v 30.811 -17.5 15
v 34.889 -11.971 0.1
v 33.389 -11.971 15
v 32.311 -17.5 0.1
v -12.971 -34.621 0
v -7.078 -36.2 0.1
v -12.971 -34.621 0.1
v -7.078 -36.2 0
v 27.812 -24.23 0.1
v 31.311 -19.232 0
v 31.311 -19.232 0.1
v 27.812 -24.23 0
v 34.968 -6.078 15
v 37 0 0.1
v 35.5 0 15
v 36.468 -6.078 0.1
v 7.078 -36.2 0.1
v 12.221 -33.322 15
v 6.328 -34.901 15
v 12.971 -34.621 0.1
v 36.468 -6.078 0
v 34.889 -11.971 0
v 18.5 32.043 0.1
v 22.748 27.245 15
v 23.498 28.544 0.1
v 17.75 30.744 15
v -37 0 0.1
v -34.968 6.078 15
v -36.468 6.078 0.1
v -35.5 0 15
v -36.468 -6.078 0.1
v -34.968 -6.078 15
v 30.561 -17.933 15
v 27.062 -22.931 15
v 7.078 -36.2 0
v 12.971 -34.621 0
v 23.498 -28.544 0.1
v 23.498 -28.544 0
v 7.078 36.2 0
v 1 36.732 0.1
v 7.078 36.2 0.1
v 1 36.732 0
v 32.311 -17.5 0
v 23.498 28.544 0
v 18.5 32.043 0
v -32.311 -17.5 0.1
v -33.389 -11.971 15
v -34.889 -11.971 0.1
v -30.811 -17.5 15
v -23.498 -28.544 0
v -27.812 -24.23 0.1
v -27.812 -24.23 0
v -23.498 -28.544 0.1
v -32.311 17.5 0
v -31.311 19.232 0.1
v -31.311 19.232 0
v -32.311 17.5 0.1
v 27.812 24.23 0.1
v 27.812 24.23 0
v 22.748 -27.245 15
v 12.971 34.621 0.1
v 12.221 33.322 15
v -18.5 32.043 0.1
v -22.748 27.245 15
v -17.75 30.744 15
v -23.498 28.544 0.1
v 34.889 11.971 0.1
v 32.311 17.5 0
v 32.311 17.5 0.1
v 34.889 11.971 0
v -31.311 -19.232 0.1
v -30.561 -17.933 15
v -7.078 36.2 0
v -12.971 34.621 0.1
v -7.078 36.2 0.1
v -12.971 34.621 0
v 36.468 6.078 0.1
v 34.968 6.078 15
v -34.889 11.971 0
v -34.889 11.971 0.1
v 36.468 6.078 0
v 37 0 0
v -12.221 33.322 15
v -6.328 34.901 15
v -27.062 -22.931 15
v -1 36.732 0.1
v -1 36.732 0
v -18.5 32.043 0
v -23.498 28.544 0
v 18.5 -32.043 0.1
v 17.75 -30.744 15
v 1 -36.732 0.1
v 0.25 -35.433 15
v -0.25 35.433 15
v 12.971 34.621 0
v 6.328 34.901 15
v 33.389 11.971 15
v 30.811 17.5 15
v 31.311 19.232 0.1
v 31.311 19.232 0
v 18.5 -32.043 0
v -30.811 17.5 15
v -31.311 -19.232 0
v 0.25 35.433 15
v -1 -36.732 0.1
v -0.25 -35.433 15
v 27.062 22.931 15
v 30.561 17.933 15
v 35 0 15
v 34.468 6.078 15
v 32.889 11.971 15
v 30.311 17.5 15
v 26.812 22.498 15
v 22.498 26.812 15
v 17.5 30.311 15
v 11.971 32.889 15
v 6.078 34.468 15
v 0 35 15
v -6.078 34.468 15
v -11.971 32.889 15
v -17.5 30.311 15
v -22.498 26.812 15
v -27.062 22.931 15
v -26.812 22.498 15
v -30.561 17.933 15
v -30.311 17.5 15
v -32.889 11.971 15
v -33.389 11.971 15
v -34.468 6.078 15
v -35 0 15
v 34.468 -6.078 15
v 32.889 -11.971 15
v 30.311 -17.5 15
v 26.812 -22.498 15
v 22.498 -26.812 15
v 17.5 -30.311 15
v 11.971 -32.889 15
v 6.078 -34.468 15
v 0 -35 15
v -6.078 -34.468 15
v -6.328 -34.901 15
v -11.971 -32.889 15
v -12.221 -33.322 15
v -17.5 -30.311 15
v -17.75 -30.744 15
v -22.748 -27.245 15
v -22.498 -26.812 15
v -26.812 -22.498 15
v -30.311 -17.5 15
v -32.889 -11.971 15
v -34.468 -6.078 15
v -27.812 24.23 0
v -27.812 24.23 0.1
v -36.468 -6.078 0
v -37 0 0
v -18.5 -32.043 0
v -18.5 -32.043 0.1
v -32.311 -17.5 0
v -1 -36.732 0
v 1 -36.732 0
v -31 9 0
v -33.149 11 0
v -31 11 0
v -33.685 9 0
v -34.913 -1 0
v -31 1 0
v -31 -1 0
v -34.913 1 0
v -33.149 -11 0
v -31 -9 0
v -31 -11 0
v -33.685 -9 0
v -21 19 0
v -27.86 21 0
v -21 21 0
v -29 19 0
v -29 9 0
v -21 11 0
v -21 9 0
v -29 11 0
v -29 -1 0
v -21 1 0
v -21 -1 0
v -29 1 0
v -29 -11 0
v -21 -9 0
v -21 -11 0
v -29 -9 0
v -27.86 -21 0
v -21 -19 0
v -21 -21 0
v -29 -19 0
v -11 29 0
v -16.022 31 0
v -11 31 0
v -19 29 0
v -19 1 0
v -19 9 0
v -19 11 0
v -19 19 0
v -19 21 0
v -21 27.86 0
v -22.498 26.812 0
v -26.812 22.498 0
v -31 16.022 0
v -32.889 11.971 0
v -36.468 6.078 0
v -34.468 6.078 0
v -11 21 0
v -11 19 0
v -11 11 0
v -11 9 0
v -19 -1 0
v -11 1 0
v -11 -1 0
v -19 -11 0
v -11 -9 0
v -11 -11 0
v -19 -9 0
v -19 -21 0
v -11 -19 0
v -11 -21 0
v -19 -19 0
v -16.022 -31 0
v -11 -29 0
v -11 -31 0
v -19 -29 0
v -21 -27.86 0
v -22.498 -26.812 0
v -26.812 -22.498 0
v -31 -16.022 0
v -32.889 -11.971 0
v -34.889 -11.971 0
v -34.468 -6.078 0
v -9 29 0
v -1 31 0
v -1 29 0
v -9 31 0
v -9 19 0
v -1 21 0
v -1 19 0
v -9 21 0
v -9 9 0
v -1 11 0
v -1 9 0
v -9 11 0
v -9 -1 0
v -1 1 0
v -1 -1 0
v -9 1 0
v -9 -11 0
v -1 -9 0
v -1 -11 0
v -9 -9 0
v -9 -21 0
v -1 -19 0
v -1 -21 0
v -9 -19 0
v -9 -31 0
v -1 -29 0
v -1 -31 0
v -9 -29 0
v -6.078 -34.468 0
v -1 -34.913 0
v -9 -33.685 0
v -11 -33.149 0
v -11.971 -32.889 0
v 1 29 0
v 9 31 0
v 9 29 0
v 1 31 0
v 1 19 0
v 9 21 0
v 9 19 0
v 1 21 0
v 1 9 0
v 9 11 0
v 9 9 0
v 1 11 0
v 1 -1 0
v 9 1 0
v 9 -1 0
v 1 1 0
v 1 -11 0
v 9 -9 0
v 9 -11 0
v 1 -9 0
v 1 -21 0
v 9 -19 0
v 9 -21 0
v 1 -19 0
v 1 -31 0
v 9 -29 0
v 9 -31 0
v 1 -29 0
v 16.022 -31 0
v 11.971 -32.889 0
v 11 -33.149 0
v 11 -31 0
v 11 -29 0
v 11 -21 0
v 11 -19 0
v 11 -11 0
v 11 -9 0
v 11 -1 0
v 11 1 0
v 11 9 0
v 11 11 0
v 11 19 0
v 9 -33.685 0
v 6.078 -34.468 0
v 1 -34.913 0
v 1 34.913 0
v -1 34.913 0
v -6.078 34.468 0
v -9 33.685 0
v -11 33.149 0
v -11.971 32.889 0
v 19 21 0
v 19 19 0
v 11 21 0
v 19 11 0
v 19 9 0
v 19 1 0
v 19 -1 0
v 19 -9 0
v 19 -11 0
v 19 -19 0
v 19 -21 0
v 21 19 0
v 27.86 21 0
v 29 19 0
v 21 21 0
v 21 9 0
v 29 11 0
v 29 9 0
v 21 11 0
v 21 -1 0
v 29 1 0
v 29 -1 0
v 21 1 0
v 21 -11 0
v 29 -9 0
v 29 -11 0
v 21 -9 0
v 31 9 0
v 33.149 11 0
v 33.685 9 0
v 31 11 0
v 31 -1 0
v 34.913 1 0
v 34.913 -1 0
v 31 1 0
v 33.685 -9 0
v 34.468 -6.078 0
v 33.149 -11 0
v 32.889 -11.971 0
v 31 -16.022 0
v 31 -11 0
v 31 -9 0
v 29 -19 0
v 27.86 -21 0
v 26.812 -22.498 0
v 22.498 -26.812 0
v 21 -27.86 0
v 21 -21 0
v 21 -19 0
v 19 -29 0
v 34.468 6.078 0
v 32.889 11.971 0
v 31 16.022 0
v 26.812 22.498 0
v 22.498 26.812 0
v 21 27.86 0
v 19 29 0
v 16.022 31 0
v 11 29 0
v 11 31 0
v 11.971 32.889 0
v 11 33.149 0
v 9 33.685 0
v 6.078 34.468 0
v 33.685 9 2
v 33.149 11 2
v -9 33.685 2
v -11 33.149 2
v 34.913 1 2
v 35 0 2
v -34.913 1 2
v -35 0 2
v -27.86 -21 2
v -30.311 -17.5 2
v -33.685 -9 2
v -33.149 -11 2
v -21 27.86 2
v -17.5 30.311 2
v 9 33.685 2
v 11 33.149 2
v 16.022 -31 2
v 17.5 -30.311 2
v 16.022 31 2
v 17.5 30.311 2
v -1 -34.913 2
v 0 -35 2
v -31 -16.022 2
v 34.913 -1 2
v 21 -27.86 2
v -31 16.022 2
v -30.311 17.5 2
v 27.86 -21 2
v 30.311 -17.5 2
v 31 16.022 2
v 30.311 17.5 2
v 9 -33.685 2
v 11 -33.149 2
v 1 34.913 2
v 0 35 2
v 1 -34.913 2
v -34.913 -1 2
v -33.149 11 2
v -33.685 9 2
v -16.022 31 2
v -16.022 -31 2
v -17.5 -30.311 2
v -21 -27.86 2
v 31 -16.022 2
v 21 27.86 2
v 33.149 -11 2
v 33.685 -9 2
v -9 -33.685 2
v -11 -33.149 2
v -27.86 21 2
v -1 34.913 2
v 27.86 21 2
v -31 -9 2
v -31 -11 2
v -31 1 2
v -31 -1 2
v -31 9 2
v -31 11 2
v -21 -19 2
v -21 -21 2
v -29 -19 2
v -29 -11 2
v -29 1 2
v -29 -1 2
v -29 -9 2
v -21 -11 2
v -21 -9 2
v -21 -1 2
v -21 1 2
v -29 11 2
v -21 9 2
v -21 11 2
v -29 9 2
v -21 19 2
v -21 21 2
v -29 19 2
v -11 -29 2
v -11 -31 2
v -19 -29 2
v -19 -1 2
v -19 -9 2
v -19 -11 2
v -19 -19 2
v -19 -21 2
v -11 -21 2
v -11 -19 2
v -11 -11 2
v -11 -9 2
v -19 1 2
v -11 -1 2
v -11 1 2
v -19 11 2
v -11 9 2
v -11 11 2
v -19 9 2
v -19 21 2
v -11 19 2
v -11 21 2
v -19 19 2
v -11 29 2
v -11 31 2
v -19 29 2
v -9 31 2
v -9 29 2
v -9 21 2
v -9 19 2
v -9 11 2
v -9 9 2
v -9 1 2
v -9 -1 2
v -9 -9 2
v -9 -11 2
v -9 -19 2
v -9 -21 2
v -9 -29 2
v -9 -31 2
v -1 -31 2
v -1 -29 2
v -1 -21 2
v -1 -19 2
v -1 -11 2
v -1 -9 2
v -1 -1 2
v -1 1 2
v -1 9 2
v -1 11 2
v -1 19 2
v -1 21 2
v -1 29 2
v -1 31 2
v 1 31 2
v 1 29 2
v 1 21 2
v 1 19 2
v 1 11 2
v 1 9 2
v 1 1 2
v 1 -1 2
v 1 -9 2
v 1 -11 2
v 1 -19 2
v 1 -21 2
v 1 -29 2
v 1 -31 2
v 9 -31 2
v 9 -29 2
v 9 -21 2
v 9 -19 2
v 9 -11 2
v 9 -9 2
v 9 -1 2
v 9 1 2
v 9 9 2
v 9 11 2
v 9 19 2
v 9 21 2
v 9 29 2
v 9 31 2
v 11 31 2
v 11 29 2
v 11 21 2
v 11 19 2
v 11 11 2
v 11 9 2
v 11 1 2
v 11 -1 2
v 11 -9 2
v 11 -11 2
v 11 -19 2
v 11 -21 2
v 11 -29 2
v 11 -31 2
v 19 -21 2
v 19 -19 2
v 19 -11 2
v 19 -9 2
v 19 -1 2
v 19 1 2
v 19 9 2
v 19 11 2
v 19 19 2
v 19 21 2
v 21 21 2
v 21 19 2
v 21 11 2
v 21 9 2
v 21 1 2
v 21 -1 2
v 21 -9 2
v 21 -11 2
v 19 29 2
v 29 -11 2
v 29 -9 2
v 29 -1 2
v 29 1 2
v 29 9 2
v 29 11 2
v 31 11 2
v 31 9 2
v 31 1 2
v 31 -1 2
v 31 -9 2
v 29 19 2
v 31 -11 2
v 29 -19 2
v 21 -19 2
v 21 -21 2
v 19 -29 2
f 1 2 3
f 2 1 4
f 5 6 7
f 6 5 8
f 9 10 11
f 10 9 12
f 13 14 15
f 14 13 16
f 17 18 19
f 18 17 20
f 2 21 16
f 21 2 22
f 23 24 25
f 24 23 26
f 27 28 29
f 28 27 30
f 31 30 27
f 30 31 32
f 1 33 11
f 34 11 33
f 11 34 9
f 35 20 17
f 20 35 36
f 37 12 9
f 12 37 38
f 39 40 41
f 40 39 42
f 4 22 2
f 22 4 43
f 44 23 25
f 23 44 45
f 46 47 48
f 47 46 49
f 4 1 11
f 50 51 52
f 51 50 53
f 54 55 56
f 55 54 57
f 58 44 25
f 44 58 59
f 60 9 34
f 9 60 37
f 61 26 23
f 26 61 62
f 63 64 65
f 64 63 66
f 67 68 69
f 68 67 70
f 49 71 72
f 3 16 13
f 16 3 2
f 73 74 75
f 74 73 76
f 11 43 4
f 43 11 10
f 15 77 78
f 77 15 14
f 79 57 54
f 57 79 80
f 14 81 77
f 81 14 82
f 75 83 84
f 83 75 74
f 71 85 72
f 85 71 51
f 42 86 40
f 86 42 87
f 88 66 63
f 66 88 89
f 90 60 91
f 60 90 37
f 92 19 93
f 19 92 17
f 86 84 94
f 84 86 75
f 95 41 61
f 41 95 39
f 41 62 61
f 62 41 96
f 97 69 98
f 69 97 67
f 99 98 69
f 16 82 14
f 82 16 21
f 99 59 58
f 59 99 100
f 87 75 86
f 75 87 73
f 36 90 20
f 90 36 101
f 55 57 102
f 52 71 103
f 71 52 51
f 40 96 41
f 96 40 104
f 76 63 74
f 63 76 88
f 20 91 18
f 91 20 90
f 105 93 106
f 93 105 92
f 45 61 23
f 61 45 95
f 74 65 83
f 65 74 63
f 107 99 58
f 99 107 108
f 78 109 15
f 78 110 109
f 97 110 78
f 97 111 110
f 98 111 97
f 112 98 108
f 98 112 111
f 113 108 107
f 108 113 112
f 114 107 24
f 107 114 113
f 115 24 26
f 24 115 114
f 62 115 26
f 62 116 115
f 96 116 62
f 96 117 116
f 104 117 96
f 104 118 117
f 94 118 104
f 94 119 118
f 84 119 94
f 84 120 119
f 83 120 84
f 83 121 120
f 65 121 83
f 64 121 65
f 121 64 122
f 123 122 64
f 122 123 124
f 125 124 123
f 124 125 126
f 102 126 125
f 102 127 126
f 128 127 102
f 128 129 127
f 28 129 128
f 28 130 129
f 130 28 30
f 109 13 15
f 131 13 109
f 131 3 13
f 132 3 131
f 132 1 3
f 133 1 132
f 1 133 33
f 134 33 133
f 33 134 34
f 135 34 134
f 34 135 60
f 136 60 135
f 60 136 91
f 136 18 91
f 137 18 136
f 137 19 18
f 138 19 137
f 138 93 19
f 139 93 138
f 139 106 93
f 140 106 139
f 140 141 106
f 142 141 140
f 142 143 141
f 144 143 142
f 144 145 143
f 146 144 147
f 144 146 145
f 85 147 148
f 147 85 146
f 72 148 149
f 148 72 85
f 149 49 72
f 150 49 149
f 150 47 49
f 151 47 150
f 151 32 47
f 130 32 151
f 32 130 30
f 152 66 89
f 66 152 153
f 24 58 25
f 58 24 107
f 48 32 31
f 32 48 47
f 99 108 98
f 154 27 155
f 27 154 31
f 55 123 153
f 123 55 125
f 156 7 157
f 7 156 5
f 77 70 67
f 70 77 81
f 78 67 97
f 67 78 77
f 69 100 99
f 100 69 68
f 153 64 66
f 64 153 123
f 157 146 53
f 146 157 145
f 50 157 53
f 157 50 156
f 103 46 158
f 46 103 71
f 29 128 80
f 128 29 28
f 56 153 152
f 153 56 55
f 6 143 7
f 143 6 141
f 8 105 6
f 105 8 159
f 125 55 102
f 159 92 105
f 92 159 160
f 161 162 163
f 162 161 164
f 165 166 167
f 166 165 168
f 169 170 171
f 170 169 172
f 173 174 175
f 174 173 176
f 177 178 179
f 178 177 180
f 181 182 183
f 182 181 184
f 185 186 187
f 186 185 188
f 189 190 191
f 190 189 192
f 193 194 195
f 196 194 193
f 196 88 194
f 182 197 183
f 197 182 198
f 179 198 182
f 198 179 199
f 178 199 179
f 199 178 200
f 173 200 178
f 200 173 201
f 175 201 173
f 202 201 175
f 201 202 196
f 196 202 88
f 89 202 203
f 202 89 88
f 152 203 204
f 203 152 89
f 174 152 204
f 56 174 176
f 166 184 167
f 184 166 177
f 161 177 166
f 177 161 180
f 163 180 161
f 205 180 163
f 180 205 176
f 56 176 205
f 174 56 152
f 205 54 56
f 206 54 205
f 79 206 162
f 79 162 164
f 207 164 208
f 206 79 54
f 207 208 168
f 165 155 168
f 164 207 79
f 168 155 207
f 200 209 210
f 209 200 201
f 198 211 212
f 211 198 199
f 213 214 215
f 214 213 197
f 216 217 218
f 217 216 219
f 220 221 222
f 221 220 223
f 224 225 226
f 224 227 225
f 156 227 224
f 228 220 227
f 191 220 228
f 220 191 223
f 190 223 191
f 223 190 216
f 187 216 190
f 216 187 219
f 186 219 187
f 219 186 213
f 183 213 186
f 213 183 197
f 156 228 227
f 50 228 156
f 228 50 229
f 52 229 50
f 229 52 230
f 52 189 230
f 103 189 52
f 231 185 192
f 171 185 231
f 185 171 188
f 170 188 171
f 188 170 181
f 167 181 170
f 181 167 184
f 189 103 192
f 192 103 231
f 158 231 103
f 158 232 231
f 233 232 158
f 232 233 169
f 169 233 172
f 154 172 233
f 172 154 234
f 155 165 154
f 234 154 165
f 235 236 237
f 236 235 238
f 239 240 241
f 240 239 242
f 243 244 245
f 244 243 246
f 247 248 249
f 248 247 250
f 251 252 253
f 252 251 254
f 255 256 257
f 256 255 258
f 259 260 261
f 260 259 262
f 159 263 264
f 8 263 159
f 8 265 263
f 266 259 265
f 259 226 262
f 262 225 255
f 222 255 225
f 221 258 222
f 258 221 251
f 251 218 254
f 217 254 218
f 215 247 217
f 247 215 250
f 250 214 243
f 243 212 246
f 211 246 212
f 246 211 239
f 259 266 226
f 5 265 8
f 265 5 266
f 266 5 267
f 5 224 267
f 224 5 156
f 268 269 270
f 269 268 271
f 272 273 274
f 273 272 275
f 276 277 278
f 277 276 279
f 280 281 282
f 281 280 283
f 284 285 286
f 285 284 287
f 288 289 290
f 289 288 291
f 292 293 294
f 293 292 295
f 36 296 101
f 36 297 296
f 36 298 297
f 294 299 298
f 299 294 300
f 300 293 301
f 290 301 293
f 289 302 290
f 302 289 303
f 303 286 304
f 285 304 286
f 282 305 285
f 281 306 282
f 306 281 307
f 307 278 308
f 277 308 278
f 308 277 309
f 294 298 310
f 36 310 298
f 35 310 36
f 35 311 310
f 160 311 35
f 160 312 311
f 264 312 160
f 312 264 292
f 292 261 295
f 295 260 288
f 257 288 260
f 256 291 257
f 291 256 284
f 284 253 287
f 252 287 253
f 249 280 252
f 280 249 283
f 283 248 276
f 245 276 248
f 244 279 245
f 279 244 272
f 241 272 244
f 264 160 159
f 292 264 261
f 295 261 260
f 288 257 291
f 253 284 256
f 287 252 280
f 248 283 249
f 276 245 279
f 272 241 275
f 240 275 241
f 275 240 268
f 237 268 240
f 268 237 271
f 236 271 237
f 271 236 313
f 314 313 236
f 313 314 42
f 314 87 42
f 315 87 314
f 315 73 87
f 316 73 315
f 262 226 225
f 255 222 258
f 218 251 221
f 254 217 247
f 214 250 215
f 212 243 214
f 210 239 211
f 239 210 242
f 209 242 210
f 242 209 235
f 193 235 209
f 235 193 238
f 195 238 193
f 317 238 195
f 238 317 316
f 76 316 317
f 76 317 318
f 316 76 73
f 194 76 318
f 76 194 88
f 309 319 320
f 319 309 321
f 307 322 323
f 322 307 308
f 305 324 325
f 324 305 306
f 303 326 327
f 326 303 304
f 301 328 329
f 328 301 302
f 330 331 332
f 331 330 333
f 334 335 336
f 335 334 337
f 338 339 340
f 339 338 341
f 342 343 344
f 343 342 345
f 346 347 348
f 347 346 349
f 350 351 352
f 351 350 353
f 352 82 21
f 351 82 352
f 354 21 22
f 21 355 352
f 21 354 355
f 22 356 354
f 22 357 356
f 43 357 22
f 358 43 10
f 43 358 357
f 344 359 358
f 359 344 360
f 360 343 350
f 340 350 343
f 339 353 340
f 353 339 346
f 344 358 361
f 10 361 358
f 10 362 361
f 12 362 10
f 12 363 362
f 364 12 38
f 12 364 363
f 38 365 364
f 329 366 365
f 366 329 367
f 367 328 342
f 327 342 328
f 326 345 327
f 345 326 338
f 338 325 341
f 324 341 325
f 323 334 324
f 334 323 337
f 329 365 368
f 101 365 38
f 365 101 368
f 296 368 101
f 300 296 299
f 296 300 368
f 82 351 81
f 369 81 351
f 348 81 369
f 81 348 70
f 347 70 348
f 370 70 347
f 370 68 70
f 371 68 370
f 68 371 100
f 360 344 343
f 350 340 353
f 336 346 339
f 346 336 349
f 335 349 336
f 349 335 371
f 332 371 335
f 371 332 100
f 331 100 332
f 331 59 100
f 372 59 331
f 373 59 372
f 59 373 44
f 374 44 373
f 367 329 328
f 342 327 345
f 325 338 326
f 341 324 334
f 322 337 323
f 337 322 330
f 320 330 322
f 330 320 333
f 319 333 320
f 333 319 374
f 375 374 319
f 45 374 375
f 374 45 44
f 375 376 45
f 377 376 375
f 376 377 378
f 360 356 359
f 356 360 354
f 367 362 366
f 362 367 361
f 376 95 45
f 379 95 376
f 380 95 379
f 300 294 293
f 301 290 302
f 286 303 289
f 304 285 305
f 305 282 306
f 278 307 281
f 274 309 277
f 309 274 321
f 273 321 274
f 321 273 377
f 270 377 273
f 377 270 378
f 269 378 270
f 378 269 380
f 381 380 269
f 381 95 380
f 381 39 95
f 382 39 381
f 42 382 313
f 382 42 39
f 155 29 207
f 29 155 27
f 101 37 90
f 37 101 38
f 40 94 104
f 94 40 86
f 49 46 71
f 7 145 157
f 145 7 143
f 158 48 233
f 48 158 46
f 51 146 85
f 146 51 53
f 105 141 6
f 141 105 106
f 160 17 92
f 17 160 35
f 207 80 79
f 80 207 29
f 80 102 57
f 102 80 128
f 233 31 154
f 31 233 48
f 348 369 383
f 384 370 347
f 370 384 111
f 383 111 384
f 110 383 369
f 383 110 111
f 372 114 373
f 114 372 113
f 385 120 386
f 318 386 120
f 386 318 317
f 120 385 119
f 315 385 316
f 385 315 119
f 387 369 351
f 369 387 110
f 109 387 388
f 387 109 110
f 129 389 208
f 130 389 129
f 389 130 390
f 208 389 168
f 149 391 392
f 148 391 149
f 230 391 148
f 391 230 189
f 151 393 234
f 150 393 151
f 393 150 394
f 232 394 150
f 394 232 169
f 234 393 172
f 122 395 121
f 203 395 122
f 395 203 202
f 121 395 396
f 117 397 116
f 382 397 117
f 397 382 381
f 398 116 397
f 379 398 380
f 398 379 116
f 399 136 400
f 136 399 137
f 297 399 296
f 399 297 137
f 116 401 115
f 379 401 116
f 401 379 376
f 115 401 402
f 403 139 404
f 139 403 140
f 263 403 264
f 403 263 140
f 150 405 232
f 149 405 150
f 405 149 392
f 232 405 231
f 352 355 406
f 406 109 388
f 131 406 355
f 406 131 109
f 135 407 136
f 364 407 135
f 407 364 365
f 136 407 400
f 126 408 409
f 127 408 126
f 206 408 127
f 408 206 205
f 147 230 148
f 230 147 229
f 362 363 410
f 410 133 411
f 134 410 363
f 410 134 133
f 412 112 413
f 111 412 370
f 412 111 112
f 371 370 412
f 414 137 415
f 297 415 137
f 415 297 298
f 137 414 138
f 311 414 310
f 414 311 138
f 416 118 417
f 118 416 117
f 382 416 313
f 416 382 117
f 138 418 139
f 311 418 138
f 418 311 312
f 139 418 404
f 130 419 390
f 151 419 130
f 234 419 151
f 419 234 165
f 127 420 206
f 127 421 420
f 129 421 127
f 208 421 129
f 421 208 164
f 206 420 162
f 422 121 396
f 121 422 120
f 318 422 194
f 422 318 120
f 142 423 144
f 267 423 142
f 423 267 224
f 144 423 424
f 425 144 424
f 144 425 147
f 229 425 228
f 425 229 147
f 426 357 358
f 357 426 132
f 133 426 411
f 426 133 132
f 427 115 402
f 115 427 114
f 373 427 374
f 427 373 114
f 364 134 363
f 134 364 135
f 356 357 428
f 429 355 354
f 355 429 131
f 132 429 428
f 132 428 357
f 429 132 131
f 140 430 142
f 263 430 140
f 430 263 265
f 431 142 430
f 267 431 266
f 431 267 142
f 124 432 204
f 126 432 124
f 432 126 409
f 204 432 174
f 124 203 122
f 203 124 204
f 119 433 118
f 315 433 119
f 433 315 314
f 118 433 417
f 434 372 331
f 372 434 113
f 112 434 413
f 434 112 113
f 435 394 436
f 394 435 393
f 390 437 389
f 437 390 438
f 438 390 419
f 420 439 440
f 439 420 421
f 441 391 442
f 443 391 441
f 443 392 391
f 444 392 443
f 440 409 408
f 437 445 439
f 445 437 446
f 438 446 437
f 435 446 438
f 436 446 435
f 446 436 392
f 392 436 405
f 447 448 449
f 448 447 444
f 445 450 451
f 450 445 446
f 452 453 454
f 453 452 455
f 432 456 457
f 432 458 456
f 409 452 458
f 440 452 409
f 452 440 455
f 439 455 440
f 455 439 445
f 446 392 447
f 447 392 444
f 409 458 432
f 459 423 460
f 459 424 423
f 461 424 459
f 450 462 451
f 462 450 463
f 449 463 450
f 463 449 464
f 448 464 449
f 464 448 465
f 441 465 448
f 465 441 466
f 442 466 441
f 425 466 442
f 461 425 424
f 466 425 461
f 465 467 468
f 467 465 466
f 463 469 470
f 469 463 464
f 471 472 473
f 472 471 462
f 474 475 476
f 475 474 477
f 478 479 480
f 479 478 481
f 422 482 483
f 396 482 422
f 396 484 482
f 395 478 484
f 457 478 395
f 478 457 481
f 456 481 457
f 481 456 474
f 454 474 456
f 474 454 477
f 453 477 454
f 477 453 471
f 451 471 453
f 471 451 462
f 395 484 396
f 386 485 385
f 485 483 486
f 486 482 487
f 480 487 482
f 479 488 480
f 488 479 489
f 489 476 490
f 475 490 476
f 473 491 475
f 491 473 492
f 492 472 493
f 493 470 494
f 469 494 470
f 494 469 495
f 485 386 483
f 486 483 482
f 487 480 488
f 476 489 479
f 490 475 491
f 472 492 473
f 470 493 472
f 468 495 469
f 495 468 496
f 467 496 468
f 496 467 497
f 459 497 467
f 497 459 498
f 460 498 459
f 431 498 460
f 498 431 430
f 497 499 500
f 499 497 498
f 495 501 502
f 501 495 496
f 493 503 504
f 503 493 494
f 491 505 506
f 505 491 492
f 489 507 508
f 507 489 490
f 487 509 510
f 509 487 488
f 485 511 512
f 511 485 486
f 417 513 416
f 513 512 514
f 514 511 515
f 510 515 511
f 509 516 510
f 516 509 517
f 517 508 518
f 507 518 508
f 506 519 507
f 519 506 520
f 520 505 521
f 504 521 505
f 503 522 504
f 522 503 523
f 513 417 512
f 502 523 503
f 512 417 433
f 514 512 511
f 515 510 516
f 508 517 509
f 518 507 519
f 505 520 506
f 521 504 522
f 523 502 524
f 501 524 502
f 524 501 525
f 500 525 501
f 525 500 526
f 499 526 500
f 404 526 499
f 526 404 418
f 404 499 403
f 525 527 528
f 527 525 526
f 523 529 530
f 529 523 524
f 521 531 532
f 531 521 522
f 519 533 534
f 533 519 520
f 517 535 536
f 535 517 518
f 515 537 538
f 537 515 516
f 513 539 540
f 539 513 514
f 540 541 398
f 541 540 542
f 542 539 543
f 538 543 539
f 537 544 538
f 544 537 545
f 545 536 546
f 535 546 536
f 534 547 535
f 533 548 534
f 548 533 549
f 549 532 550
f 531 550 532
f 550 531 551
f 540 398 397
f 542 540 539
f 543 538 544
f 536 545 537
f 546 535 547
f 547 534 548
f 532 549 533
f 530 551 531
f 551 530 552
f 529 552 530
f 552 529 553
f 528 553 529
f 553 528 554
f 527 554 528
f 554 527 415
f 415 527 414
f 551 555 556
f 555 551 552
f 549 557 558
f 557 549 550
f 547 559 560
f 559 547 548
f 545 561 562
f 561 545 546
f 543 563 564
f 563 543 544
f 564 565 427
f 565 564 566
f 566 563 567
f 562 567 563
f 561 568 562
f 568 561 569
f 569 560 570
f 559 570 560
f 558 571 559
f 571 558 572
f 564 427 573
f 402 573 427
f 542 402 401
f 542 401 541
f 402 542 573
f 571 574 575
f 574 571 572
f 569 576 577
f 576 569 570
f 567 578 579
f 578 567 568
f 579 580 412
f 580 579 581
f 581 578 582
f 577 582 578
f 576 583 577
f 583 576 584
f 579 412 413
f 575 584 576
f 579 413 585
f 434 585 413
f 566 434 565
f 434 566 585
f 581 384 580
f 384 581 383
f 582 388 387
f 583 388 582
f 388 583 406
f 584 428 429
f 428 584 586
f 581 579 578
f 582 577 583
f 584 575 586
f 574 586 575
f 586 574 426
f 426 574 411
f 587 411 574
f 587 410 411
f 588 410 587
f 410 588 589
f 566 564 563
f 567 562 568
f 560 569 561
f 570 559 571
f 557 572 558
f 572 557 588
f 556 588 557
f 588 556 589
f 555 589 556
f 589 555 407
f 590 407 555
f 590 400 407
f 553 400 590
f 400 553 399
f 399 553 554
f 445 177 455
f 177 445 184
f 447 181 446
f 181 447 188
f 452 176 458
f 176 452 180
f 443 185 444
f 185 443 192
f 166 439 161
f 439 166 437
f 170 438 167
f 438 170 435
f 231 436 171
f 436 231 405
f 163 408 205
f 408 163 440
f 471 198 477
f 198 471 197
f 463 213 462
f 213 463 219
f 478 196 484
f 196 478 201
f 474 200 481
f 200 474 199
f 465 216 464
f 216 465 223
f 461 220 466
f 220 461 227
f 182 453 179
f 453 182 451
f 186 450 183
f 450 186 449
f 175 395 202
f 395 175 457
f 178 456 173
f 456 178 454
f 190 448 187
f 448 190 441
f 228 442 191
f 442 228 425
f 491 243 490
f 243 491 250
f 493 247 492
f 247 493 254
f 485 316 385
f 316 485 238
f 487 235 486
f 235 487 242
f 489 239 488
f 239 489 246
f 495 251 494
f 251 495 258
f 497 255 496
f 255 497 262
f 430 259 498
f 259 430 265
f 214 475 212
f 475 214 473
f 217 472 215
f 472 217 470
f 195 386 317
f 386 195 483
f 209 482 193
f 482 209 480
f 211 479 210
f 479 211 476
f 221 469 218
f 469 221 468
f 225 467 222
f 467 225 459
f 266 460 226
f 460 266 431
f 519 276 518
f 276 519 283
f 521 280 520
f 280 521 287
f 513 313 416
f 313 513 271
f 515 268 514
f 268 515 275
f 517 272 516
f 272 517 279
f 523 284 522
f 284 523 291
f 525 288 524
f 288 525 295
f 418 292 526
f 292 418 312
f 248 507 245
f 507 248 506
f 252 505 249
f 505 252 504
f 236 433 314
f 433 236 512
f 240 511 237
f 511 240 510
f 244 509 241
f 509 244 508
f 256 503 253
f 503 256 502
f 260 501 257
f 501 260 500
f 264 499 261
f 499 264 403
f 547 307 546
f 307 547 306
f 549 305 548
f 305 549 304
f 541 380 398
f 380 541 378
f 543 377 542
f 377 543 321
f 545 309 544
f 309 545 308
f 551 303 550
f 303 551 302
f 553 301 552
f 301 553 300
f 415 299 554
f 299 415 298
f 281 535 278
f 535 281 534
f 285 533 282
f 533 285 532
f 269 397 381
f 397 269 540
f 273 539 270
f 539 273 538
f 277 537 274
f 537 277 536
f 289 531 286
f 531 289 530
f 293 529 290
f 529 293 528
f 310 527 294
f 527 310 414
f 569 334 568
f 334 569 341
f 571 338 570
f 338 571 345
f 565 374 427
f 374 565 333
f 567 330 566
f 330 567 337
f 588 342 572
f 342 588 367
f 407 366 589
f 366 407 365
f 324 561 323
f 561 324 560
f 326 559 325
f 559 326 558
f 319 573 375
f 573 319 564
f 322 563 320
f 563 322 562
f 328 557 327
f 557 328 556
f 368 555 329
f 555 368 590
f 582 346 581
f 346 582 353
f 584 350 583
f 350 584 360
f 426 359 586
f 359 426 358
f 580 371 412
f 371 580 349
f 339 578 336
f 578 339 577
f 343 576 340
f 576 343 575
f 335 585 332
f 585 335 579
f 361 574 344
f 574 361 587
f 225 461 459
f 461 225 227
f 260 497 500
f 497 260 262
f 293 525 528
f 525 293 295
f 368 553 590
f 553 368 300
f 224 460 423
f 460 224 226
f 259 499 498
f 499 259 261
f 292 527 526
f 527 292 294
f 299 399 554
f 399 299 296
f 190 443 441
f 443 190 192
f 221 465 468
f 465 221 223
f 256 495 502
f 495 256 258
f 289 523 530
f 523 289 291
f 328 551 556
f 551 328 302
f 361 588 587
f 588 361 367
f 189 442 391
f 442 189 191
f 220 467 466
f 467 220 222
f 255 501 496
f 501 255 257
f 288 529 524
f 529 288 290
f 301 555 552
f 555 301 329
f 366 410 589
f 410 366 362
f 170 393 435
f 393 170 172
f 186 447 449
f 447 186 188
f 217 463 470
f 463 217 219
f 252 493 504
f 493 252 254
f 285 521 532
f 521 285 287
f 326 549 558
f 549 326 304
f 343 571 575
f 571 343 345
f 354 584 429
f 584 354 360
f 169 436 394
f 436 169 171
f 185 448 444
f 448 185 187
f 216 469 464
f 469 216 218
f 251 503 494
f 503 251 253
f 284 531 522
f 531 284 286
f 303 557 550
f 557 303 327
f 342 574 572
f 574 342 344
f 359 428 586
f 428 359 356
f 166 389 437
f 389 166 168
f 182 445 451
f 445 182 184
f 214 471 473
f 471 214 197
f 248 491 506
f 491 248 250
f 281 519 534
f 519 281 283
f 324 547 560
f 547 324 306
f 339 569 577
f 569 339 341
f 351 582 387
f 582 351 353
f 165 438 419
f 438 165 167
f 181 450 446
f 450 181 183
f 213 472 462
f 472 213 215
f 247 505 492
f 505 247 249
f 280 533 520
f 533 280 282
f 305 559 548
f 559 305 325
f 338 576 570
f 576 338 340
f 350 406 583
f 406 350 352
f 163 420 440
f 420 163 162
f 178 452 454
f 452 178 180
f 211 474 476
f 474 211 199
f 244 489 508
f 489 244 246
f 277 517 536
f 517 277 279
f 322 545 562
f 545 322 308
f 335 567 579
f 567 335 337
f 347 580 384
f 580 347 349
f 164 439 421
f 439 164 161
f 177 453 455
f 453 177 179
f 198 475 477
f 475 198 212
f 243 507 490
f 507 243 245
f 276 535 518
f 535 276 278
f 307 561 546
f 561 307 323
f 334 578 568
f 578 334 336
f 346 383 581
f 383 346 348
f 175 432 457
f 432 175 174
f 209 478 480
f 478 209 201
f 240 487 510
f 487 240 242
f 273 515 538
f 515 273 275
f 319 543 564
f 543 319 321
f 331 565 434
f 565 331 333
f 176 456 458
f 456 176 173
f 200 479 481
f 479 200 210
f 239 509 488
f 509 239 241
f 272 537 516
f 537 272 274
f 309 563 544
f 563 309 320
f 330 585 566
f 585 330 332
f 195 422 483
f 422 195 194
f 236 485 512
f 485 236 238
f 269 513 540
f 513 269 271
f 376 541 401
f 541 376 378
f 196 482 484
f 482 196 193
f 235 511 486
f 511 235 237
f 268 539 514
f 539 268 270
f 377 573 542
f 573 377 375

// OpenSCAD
// file: cookie-cutter.scad
// Cookie Cutter renders a DXF file as a cookie cutter.
// by Mike Koss (c) 2013
// FILE should be  contained to a 100x100 mm area.

SCALE = 1.0;

E = 0.1;
FILE = "club.dxf";

// Cookie cutter cutting depth.
DEPTH = 15;
MIN_WALL = 0.5;
MAX_WALL = 2.0;

module cookie_cutter() {
  outline(DEPTH, MAX_WALL, MIN_WALL) child(0);
  intersection() {
    linear_extrude(height=2)
      child(0);
    grid(100 * SCALE, 100 * SCALE, 10, 2);
  }
}

module outline(height, base, top) {
  difference() {
    minkowski() {
      linear_extrude(height=E)
        child(0);
      cylinder(r1=base, r2=top, h=height - E, $fn=6);
    }
    translate([0, 0, -E])
      linear_extrude(height=height + 2 * E)
        child(0);
  }
}

module chamfer(height, edge=1.5) {
  minkowski() {
    linear_extrude(height=height - edge)
      child(0);
    cylinder(r1=edge, r2=0.1, h=edge, $fn=6);
  }
}

// Create a rectilinear grid to add stiffness and
// ensure any holes within the image are connected to the part.
module grid(x, y, d, thickness) {
  cx = floor(x / d);
  cy = floor(y / d);
  for (ix = [0: cx]) {
    translate([(ix - cx / 2) * d, 0, thickness / 2])
      cube([thickness, y + thickness, thickness], center=true);
  }
  for (iy = [0: cy]) {
    translate([0, (iy - cy / 2) * d, thickness / 2])
      cube([x + thickness, thickness, thickness], center=true);
  }
}

// Why is the file scaled by 80% from the 100mm svg original?
cookie_cutter()
  scale([-SCALE, SCALE, 1]) translate([-50, -50, 0]) scale(1.25) import(file=FILE);
// main file
use <cookie-cutter.scad>;

SCALE = 1.0;

chamfer(11, edge=1.2)
  scale(0.9)
    scale([-1, 1, 1])
      translate([-29, -32.5, 0]) import("ribeiro-symbol.dxf");

cookie_cutter()
  circle(r=35, $fa=10);
